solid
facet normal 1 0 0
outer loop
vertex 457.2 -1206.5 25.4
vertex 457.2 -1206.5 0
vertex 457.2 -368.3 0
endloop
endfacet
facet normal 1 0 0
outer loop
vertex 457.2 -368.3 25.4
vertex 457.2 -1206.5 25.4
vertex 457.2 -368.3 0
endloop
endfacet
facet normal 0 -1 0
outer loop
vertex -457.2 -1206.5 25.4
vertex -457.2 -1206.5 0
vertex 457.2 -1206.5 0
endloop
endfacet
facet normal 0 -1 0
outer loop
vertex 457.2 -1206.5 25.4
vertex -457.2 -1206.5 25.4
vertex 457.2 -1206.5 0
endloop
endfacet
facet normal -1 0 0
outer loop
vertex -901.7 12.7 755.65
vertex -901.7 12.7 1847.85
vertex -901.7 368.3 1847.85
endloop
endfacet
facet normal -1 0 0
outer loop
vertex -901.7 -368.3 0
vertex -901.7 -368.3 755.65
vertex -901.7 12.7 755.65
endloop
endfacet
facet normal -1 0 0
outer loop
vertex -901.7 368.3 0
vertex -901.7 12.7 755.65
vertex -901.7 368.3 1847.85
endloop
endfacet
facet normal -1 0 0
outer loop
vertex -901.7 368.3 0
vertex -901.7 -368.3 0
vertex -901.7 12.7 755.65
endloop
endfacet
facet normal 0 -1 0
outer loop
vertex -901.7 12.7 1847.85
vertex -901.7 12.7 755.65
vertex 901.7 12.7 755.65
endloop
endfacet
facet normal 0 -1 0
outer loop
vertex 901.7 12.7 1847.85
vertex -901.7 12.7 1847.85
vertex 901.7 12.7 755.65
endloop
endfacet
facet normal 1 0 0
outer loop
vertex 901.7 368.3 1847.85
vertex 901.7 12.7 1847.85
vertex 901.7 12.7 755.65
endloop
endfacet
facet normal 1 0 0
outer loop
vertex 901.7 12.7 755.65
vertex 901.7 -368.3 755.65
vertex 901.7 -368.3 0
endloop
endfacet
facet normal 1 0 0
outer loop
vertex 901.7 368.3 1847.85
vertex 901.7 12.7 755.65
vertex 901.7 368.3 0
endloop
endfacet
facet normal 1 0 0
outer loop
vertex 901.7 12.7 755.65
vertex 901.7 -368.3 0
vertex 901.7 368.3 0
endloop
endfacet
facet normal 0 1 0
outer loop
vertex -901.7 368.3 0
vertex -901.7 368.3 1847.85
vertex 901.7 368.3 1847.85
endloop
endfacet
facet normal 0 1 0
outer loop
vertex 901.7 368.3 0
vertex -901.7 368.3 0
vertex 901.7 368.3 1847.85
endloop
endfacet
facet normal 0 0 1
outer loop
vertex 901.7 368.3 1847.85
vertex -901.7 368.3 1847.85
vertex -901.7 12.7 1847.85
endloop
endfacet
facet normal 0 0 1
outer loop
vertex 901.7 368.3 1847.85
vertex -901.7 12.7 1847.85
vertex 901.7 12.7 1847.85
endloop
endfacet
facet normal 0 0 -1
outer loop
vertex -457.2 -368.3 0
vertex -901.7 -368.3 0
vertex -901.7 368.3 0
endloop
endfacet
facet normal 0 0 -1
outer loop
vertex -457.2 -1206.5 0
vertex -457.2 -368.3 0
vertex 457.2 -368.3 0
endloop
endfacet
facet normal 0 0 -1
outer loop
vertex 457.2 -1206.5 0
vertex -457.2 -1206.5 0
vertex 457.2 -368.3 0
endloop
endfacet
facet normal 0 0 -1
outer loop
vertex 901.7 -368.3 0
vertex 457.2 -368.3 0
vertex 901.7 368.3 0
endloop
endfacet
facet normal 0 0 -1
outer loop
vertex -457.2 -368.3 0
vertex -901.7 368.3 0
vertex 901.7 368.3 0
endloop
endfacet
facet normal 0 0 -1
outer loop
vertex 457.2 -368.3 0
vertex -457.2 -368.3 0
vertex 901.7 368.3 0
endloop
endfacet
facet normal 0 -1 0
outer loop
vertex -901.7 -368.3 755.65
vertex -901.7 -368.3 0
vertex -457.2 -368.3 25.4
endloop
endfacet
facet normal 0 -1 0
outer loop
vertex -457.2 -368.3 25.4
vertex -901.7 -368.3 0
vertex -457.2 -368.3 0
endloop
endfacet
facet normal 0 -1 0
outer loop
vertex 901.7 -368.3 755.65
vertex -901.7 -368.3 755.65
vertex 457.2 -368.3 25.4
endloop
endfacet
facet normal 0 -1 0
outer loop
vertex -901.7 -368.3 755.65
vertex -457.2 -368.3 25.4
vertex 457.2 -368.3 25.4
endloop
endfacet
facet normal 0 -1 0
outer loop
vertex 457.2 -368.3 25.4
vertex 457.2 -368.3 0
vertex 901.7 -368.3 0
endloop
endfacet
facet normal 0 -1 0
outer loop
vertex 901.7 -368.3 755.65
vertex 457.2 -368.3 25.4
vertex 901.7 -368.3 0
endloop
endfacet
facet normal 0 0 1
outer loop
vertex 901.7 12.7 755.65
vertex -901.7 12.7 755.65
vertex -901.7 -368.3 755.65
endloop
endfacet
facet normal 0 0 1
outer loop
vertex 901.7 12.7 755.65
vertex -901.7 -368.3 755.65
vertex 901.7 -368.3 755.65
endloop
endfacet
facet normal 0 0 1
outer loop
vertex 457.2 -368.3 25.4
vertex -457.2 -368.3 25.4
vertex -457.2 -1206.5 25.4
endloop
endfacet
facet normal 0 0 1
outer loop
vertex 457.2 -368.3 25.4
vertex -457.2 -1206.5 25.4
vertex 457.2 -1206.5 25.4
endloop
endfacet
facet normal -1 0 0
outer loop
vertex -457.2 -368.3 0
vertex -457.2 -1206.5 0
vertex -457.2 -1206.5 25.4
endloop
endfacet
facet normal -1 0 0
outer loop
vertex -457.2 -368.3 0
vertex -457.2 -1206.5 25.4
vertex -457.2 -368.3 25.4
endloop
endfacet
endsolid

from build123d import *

# Parameters (mm, degrees)
F0_W     = 1803.4
F0_H     = 736.6
F2_DEPTH = 755.65
F1_W     = 914.4
F1_H     = 838.2
F3_DEPTH = 25.4
F4_W     = 1803.4
F4_H     = 355.6
F5_DEPTH = 1092.2


with BuildPart() as f2:
    # F0 (on Top) → F2 (new body)
    with BuildSketch(Plane.XY):
        Rectangle(F0_W, F0_H)
    extrude(amount=F2_DEPTH)

    # F1 (on Top) → F3 (join)
    with BuildSketch(Plane.XY):
        with Locations((0, -787.4)):
            Rectangle(F1_W, F1_H)
    extrude(amount=F3_DEPTH)

    # F4 (on face) → F5 (join)
    with BuildSketch(Plane.XY.offset(755.65)):
        with Locations((0, 190.5)):
            Rectangle(F4_W, F4_H)
    extrude(amount=F5_DEPTH)


solid = f2.part
